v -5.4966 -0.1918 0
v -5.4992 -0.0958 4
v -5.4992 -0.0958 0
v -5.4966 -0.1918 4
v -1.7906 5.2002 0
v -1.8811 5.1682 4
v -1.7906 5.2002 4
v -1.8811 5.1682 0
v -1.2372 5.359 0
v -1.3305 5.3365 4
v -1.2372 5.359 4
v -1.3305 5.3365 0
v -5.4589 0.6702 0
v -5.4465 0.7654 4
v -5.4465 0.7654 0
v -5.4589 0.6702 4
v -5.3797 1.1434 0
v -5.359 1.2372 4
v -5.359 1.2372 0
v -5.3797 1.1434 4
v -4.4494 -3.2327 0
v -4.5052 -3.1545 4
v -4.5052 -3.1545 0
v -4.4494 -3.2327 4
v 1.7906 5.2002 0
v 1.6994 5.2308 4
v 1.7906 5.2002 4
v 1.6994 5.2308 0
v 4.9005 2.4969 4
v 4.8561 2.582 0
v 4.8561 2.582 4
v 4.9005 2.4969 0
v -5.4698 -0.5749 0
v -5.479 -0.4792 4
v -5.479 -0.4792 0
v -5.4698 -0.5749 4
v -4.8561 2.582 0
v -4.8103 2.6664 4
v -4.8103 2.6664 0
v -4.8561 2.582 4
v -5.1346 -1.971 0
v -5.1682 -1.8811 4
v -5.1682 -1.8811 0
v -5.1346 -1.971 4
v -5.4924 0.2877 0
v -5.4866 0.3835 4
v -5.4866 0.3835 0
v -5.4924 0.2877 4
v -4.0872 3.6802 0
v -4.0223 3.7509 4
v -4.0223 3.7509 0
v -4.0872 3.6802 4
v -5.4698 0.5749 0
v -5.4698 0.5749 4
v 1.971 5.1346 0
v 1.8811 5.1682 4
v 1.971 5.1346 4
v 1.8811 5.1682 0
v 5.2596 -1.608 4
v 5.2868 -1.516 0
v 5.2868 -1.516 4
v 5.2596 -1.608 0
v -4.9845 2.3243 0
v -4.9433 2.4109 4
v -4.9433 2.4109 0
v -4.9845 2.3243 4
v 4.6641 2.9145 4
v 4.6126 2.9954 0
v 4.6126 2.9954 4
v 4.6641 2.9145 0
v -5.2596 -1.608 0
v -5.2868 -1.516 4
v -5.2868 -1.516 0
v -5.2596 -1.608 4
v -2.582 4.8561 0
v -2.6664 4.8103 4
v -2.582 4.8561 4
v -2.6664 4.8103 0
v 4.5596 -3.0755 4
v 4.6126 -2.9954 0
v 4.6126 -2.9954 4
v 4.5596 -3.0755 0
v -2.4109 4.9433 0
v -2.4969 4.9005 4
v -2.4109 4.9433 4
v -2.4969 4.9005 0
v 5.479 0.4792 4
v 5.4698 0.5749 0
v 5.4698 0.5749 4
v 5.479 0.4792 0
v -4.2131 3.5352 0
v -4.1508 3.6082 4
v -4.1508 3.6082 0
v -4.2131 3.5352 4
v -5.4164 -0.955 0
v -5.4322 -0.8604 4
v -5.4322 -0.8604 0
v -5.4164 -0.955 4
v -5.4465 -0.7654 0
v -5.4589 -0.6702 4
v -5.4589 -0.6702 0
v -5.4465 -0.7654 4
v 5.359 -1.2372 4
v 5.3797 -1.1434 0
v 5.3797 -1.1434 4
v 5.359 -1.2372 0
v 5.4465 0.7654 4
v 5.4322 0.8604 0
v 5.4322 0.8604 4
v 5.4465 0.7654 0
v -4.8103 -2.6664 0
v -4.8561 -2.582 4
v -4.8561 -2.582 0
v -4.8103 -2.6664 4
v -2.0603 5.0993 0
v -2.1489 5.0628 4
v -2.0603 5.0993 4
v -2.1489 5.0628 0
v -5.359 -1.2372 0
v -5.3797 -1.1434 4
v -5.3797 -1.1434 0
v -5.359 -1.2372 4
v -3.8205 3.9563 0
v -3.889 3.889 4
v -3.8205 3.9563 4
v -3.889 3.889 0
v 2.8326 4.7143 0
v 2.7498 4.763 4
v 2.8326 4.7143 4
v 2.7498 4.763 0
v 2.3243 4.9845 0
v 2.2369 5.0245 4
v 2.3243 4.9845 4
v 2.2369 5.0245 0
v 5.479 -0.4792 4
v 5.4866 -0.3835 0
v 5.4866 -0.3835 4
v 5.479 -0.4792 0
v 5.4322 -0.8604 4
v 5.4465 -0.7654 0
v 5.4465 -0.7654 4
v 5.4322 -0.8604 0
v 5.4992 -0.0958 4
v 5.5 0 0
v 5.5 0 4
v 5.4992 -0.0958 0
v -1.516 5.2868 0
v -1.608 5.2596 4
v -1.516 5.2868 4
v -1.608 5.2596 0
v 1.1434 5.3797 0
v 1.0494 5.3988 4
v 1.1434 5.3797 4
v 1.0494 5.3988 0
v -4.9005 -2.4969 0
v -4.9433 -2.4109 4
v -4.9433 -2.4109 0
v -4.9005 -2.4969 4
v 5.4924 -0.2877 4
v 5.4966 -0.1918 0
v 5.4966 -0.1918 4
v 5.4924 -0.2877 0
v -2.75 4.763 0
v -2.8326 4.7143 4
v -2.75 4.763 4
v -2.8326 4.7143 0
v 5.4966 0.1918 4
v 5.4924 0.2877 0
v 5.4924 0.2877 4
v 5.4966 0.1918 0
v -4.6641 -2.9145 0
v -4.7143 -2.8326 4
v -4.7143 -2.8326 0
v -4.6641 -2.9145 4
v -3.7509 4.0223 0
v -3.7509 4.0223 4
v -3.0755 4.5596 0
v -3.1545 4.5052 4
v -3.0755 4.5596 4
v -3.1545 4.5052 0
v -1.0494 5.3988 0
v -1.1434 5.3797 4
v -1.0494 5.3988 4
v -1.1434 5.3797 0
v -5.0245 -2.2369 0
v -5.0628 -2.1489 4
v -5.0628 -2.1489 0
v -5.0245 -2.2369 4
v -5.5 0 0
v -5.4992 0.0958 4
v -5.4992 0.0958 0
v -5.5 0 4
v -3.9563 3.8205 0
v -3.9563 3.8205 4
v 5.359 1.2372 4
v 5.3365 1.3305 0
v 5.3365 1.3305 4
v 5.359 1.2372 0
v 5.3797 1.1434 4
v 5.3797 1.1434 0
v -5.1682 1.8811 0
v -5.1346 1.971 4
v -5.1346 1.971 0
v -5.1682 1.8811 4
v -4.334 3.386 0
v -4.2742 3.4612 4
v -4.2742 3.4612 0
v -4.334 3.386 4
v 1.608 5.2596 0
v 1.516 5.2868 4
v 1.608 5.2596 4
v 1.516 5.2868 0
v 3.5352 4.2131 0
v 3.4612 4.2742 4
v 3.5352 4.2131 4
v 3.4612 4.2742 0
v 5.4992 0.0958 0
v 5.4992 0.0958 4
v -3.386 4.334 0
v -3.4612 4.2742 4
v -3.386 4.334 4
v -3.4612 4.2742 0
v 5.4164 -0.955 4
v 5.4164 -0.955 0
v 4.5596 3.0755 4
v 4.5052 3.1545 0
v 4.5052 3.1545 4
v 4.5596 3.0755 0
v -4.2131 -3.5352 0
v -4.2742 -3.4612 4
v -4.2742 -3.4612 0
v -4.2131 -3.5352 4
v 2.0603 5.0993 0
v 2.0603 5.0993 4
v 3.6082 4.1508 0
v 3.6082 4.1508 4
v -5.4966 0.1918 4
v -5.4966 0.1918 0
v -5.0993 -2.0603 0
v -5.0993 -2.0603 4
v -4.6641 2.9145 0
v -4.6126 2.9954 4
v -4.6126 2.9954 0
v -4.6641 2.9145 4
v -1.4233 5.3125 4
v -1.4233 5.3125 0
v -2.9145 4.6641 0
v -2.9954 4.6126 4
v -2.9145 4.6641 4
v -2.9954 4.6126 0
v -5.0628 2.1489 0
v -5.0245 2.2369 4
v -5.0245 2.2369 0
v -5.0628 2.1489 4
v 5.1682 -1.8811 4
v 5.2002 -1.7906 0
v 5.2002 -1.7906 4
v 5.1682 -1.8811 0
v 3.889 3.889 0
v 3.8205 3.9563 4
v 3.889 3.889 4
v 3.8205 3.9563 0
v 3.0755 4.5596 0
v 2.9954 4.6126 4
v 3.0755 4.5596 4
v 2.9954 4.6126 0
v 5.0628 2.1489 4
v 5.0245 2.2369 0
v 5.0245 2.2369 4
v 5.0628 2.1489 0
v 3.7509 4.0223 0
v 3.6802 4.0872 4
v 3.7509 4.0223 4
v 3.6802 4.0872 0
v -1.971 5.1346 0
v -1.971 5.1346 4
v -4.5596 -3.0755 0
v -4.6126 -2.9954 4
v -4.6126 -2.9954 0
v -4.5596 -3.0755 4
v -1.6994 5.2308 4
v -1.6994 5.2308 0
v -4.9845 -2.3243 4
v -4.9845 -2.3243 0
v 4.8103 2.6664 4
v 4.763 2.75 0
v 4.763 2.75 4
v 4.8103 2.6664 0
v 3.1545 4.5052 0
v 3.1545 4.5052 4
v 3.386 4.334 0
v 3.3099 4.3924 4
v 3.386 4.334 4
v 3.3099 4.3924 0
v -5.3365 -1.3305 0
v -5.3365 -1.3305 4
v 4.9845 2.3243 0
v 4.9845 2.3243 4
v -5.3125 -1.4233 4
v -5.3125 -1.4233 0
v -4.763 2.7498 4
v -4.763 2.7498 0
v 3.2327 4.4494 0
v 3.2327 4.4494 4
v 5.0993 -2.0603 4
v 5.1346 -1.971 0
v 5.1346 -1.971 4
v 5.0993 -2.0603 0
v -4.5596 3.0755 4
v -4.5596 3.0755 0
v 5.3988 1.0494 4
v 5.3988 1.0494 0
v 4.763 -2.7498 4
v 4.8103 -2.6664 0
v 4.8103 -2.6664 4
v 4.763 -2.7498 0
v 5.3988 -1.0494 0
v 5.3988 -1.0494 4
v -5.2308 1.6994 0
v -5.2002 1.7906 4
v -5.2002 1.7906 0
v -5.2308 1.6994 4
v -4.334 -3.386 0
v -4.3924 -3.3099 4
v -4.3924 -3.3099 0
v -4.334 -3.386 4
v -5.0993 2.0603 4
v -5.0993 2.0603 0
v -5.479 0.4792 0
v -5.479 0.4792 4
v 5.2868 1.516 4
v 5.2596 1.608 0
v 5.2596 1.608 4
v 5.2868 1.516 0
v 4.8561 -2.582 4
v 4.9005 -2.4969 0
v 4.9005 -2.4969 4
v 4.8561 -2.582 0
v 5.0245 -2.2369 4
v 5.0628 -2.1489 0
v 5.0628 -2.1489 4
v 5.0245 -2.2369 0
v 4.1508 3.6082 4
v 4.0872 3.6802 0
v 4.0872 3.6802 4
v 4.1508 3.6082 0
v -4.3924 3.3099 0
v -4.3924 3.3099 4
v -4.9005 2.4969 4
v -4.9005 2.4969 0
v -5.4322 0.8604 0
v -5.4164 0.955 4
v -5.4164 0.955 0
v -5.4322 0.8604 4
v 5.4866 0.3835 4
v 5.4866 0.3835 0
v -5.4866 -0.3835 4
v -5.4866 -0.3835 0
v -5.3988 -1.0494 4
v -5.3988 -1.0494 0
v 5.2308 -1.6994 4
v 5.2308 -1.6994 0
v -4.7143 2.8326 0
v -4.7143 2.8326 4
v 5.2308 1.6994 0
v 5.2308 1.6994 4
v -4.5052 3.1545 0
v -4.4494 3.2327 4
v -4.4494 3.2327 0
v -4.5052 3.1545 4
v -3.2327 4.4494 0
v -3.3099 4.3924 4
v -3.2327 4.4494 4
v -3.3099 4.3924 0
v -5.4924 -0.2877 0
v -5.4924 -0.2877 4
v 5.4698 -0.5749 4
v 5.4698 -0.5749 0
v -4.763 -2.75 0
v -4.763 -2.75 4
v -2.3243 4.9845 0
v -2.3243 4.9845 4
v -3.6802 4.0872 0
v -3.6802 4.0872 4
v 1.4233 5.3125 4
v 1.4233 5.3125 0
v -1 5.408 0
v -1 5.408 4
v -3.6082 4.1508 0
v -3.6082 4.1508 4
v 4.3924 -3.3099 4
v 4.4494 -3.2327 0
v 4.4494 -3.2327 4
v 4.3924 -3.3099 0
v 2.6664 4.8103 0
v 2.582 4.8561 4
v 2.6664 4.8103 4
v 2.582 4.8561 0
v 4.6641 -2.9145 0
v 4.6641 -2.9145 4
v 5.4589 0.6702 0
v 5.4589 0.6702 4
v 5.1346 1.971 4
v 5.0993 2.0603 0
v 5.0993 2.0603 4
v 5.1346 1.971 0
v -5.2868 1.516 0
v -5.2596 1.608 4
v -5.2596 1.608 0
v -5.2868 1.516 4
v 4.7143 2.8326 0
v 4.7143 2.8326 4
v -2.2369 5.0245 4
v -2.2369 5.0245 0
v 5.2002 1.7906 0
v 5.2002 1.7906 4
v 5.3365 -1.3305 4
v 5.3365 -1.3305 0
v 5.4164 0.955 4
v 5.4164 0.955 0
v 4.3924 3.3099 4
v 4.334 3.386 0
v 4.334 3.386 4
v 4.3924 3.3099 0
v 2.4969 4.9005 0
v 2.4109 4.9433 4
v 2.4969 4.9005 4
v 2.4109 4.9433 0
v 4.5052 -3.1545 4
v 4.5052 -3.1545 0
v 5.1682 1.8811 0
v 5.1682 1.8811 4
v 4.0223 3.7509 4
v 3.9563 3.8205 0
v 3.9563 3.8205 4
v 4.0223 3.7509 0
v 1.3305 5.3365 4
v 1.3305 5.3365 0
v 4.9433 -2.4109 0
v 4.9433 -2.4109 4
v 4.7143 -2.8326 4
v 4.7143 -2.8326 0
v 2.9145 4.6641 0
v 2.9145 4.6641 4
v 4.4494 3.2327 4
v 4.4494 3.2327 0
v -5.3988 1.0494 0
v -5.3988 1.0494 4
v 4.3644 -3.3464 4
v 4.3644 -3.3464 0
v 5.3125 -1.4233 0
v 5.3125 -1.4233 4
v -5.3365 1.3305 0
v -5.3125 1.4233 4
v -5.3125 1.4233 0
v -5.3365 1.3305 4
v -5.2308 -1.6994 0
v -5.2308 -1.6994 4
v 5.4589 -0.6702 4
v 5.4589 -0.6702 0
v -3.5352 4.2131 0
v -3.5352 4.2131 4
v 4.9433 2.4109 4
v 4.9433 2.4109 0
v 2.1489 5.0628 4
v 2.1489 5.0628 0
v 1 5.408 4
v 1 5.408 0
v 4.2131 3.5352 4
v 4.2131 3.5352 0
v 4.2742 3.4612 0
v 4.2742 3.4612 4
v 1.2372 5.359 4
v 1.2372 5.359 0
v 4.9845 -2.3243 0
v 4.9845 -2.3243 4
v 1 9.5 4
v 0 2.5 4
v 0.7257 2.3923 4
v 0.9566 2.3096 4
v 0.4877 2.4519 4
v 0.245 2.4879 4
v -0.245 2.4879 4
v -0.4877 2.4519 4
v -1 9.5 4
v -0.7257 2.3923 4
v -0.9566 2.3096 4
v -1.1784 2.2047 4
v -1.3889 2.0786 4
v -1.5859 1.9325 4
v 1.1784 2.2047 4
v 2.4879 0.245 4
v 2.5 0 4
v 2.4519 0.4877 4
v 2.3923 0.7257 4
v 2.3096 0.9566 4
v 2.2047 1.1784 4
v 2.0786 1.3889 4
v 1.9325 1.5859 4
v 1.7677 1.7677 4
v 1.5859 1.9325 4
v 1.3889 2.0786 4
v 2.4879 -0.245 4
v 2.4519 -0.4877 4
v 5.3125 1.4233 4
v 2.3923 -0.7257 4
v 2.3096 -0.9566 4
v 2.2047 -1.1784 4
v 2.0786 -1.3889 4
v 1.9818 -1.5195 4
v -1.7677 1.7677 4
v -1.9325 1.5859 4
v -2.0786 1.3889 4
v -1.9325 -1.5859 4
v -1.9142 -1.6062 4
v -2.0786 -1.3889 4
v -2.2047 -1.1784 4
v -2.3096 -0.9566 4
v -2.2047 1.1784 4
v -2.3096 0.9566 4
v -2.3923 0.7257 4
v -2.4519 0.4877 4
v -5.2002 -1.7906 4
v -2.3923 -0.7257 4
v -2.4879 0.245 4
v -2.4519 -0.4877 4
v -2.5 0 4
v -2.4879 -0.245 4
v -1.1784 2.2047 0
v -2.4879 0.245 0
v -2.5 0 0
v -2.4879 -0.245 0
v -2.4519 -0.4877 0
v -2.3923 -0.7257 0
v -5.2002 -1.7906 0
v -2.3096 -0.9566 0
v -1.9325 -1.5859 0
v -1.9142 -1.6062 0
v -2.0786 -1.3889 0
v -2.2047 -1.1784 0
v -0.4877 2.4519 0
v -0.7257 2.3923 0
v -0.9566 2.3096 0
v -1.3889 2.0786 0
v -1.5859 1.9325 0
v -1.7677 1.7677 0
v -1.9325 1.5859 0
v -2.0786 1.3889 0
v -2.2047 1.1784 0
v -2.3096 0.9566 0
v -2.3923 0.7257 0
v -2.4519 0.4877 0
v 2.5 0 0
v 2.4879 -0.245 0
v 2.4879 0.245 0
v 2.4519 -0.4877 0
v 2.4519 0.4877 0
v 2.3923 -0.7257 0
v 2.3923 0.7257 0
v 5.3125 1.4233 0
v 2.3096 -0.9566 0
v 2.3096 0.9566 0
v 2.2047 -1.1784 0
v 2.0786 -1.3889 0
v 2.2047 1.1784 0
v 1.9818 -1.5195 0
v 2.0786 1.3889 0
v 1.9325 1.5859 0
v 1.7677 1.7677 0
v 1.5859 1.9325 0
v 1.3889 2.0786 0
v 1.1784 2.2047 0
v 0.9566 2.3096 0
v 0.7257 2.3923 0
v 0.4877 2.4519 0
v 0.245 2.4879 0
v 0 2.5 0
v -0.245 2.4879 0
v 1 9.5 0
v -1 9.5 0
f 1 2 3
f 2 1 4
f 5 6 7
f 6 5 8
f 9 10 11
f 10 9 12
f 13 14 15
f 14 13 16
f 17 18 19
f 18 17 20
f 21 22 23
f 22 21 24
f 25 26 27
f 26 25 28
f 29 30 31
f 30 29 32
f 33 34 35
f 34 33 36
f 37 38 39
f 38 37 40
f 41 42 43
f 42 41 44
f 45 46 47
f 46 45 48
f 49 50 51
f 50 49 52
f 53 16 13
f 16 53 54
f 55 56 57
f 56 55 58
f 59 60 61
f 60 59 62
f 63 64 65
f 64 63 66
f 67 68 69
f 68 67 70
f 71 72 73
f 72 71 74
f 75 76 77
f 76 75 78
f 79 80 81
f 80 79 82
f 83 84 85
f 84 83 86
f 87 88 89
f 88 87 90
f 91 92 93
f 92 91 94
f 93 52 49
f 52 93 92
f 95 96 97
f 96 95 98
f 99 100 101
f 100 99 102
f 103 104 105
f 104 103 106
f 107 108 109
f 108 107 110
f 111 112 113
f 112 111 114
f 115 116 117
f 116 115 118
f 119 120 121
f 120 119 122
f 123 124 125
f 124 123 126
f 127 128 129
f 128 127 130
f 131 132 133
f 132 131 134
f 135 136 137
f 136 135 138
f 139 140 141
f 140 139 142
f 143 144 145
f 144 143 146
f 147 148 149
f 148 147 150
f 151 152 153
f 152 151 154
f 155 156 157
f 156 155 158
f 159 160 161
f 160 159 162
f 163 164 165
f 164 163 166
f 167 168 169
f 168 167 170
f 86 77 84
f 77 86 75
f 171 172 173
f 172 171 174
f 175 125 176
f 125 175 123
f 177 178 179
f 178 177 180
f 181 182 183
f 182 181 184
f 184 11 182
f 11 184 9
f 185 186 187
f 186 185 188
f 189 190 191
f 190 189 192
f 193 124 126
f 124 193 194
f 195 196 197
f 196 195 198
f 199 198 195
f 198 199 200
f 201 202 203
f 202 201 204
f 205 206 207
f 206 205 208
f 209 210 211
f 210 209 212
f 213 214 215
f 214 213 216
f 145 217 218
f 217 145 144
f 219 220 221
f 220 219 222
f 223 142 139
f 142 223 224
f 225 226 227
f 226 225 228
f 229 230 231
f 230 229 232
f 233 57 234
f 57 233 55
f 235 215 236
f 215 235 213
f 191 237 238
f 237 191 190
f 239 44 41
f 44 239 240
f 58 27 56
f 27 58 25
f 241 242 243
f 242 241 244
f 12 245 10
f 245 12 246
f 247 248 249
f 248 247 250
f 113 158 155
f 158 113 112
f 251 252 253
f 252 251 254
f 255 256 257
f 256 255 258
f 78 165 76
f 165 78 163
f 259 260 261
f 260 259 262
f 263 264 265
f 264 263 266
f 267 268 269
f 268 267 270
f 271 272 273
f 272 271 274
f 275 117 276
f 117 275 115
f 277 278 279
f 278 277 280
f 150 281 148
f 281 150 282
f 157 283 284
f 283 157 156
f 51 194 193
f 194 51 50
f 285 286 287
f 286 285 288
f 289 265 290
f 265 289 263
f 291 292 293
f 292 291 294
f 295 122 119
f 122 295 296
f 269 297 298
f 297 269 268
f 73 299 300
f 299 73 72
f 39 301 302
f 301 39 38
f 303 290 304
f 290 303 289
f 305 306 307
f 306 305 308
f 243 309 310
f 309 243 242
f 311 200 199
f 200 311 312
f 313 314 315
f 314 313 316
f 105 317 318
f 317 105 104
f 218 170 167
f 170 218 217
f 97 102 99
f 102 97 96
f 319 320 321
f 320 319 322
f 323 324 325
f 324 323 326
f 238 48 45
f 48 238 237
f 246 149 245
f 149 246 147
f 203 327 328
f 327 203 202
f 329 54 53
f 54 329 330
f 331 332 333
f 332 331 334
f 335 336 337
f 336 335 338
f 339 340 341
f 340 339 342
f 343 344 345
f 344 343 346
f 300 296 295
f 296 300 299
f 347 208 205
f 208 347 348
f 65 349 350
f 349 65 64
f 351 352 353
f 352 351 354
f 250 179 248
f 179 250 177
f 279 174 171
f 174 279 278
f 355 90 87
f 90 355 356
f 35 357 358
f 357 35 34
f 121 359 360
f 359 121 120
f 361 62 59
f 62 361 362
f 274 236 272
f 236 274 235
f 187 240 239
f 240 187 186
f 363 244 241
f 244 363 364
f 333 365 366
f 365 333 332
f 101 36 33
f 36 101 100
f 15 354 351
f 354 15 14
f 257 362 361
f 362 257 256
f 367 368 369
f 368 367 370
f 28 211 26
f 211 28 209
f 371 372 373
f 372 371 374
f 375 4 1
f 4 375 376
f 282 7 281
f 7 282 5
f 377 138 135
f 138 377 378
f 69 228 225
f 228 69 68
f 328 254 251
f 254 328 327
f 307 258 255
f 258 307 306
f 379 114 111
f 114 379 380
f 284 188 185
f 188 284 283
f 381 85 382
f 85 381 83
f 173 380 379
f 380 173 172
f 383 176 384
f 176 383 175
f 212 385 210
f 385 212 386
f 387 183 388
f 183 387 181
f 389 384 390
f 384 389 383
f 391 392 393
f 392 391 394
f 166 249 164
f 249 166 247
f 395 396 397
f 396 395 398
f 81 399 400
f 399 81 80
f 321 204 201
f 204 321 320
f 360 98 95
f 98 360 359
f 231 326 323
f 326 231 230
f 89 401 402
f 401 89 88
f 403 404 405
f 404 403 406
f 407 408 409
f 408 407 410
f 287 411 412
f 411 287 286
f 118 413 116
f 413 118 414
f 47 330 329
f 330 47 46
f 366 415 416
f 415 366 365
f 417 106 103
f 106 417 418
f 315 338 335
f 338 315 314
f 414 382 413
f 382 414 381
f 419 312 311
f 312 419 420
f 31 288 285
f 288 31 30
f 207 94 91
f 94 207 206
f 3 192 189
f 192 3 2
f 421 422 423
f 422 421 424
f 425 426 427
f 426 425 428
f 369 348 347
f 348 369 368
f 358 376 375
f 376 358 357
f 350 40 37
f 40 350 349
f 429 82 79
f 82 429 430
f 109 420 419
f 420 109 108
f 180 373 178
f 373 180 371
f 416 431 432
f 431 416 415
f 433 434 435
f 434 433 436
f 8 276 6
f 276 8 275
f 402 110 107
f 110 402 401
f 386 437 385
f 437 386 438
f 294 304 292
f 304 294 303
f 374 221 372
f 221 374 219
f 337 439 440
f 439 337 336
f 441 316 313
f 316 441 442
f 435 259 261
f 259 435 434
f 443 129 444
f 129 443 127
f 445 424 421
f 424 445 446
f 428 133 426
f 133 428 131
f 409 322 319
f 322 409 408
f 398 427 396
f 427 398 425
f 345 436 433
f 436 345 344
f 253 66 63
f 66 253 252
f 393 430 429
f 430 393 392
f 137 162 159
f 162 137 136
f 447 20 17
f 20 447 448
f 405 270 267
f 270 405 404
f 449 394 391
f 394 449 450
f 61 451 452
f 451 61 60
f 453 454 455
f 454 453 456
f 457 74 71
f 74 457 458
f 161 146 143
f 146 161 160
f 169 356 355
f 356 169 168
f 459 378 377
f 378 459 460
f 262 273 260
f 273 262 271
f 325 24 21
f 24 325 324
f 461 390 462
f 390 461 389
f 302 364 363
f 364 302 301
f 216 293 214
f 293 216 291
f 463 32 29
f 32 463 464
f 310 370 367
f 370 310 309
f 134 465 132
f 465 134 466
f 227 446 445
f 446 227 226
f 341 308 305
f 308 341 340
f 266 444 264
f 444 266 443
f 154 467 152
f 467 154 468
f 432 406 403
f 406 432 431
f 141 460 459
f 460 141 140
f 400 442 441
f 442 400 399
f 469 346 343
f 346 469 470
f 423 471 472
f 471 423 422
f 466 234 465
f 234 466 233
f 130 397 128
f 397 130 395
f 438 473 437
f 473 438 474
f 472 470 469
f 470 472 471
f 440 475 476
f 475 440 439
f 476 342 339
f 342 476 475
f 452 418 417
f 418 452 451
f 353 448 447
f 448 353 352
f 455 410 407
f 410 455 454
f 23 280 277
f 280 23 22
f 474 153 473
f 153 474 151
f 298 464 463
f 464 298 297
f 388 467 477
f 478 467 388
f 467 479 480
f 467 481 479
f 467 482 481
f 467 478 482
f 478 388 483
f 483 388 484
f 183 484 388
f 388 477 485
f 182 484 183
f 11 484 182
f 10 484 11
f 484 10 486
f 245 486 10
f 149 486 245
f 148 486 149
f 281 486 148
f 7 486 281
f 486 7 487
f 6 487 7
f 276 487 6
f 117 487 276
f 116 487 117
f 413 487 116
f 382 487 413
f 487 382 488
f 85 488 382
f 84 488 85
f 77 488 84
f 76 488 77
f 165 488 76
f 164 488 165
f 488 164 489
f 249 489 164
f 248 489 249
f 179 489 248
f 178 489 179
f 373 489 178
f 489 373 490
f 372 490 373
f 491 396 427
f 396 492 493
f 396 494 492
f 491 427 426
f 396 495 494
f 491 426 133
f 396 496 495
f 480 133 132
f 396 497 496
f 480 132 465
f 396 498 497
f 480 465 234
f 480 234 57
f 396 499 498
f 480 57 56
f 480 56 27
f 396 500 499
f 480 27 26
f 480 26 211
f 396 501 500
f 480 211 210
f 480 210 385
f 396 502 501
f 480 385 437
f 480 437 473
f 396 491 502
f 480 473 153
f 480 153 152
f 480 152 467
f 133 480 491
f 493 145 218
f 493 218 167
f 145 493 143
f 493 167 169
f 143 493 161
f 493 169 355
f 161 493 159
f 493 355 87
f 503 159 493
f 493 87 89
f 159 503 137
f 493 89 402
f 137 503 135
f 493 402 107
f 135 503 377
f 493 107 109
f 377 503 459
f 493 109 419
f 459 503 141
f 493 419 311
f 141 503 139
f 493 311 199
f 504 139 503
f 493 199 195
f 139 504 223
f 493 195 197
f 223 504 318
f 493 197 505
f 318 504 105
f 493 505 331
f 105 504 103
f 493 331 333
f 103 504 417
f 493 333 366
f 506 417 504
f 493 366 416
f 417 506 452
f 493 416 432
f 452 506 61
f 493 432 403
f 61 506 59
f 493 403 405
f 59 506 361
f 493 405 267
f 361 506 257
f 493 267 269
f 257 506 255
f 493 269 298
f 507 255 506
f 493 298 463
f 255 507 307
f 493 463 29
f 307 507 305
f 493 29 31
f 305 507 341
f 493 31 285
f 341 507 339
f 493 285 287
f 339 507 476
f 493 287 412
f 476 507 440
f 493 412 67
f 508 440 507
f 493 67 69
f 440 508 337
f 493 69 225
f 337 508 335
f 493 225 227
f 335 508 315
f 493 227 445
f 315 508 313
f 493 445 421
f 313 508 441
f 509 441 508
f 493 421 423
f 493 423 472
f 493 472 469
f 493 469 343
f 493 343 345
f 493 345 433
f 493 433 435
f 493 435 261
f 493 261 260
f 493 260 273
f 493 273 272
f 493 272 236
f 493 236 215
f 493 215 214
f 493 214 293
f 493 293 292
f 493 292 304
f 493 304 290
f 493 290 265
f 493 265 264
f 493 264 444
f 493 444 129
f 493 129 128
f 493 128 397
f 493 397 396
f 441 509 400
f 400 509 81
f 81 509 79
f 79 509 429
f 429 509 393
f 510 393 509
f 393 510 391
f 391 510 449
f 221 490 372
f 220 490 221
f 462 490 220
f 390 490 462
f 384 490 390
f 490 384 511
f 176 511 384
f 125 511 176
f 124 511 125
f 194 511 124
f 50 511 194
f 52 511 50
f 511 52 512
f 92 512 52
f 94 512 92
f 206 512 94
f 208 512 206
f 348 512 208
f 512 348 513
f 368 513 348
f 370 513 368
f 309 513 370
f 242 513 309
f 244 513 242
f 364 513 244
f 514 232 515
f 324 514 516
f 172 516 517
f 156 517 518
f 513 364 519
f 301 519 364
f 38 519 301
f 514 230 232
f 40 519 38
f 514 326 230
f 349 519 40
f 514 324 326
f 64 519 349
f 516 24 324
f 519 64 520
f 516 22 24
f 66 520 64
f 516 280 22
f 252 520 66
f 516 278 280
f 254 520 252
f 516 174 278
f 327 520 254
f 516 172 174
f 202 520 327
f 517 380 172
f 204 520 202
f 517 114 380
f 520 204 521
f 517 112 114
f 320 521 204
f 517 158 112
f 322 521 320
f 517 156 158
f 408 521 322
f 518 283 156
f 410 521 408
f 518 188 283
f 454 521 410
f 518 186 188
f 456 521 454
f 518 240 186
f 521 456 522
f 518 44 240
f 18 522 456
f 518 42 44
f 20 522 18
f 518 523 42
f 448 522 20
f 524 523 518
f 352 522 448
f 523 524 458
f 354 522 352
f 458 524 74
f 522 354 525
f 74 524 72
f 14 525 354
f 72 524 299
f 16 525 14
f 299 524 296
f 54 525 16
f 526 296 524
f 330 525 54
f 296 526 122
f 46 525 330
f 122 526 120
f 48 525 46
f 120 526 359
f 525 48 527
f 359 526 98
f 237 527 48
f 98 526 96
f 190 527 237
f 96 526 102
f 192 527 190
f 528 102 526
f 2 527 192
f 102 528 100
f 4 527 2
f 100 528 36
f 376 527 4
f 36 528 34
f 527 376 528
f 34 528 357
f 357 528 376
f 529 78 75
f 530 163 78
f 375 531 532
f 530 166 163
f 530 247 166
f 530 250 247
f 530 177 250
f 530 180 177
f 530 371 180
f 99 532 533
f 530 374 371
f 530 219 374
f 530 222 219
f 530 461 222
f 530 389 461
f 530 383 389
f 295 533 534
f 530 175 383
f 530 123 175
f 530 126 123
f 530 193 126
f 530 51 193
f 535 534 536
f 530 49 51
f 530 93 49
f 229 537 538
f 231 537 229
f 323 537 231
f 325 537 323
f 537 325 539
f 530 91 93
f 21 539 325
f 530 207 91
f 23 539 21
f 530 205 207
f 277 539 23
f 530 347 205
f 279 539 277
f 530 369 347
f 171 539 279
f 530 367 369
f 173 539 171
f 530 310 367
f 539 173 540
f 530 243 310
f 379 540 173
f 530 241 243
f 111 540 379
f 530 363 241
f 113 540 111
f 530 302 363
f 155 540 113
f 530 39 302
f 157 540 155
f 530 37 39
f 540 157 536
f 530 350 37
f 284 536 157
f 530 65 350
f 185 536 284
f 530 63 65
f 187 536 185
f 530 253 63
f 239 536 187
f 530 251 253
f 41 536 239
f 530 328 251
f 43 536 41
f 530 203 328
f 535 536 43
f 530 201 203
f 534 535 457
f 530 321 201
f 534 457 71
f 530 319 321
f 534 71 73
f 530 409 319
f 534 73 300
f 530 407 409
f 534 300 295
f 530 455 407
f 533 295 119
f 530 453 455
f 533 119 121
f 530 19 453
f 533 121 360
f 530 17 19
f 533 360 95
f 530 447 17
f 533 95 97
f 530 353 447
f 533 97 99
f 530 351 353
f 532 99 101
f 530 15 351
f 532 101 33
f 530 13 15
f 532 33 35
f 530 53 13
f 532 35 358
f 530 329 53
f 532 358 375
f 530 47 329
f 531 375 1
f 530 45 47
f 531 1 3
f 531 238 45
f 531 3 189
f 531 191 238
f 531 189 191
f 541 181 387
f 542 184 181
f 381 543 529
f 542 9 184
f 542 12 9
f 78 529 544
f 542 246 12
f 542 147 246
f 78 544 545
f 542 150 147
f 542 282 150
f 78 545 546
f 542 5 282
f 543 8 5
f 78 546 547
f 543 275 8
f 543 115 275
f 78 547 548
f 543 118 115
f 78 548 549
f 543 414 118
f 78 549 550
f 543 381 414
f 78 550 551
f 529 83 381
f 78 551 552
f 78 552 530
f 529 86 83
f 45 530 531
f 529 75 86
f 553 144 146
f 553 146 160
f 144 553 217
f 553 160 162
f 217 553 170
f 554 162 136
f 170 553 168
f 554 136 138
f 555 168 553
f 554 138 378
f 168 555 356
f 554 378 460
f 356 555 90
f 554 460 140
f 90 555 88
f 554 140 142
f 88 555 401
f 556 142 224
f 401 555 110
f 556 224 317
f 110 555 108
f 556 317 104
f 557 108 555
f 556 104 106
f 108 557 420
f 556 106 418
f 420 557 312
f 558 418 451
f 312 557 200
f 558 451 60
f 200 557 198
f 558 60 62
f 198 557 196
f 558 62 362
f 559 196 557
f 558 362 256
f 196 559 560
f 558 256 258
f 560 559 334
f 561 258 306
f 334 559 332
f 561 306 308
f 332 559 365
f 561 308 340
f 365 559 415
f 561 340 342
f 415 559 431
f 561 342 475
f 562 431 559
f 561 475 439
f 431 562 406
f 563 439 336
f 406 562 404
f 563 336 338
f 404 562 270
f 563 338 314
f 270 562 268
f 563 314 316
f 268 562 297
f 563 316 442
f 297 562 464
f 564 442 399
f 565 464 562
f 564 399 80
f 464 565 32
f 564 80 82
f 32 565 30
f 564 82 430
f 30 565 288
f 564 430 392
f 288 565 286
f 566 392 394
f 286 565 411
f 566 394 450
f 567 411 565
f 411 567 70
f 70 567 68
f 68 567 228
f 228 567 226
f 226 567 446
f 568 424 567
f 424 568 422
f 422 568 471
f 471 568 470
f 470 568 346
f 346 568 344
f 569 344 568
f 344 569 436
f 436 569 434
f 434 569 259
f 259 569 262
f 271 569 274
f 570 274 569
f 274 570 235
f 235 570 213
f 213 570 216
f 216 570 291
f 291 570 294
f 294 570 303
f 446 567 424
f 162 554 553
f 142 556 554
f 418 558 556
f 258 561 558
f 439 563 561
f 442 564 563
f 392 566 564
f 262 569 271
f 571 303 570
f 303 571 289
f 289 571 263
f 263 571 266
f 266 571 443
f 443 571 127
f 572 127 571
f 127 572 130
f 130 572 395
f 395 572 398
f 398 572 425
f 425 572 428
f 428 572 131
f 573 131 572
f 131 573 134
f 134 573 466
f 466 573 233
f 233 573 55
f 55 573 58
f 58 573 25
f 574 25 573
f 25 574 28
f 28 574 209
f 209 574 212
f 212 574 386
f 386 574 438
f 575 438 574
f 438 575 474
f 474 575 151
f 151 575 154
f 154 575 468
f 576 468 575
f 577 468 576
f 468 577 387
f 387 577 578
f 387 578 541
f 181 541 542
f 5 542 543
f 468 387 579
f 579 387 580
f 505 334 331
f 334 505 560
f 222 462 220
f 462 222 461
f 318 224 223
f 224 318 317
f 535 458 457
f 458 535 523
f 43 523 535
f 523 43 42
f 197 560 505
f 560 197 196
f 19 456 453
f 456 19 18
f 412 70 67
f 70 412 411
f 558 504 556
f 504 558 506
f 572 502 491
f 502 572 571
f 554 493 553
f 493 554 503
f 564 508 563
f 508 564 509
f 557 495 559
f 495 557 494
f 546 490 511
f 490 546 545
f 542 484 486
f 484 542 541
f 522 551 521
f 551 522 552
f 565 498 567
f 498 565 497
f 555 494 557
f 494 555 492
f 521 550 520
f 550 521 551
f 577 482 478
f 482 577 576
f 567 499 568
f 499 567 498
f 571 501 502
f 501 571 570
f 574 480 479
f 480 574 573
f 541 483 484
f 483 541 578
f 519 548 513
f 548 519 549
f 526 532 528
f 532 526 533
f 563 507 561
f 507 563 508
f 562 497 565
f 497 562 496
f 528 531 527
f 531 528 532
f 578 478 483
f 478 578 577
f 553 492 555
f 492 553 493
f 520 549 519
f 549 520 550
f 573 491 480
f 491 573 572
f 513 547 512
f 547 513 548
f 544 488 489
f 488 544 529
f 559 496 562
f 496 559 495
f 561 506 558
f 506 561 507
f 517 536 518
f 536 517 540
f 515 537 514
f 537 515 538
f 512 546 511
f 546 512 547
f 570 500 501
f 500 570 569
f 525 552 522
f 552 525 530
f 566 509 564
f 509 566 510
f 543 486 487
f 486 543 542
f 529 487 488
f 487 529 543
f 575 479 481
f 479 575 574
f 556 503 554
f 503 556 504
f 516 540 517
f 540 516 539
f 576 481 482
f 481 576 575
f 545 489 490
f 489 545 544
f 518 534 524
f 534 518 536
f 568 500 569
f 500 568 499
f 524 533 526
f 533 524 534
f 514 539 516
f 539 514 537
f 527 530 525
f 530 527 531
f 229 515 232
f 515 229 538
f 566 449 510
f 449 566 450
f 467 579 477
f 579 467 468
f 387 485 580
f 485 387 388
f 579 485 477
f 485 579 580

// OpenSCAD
union()
{
    difference()
    {
        difference()
        {
            linear_extrude(height = 4.0, twist = 0.0, scale = 1.0, slices = 1, center = false)
            {
                scale([11.0, 11.0])
                {
                    M625();
                }
            }
            linear_extrude(height = 4.0, twist = 0.0, scale = 1.0, slices = 1, center = false)
            {
                scale([5.0, 5.0])
                {
                    M101();
                }
            }
        }
        linear_extrude(height = 4.0, twist = 0.0, scale = 1.0, slices = 1, center = false)
        {
            rotate(-140.0)
            {
                M152();
            }
        }
    }
    translate([0.0, 6.0, 0.0])
    {
        linear_extrude(height = 4.0, twist = 0.0, scale = 1.0, slices = 1, center = false)
        {
            scale([2.0, 7.0])
            {
                M8();
            }
        }
    }
}

module M625()
{
    polygon
    (
        points =
        [
            [0.5, 0.0], 
            [0.49992384757819563, 0.008726203218641756], 
            [0.4996954135095479, 0.017449748351250485], 
            [0.4993147673772869, 0.026167978121471914], 
            [0.4987820251299121, 0.03487823687206265], 
            [0.4980973490458728, 0.04357787137382909], 
            [0.49726094768413664, 0.05226423163382673], 
            [0.496273075820661, 0.06093467170257374], 
            [0.4951340343707852, 0.06958655048003272], 
            [0.4938441702975689, 0.07821723252011543], 
            [0.492403876506104, 0.08682408883346518], 
            [0.490813591723832, 0.09540449768827242], 
            [0.48907380036690284, 0.10395584540887966], 
            [0.4871850323926176, 0.1124755271719325], 
            [0.48514786313799824, 0.12096094779983387], 
            [0.48296291314453416, 0.1294095225512604], 
            [0.48063084796915945, 0.13781867790849958], 
            [0.4781523779815178, 0.14618585236136836], 
            [0.47552825814757677, 0.1545084971874737], 
            [0.4727592877996584, 0.16278407722857835], 
            [0.46984631039295416, 0.17101007166283438], 
            [0.46679021324860087, 0.17918397477265013], 
            [0.4635919272833937, 0.18730329670795604], 
            [0.46025242672622013, 0.1953655642446369], 
            [0.45677272882130043, 0.20336832153790008], 
            [0.45315389351832497, 0.21130913087034972], 
            [0.4493970231495835, 0.2191855733945387], 
            [0.44550326209418395, 0.22699524986977337], 
            [0.4414737964294635, 0.2347357813929454], 
            [0.43730985356969787, 0.24240481012316853], 
            [0.4330127018922193, 0.25], 
            [0.42858365035105617, 0.2575190374550271], 
            [0.424024048078213, 0.26495963211660245], 
            [0.419335283972712, 0.27231951750751354], 
            [0.41451878627752087, 0.2795964517353734], 
            [0.4095760221444959, 0.286788218175523], 
            [0.4045084971874737, 0.29389262614623657], 
            [0.3993177550236464, 0.30090751157602413], 
            [0.39400537680336095, 0.30783073766282915], 
            [0.38857298072848545, 0.31466019552491875], 
            [0.383022221559489, 0.3213938048432697], 
            [0.377354790111386, 0.32802951449525364], 
            [0.3715724127386971, 0.3345653031794291], 
            [0.36567685080958523, 0.34099918003124924], 
            [0.35966990016932554, 0.3473291852294987], 
            [0.3535533905932738, 0.35355339059327373], 
            [0.3473291852294986, 0.3596699001693256], 
            [0.34099918003124924, 0.36567685080958523], 
            [0.3345653031794291, 0.37157241273869707], 
            [0.32802951449525364, 0.377354790111386], 
            [0.3213938048432697, 0.383022221559489], 
            [0.31466019552491875, 0.3885729807284854], 
            [0.30783073766282915, 0.394005376803361], 
            [0.3009075115760242, 0.3993177550236464], 
            [0.29389262614623657, 0.4045084971874737], 
            [0.2867882181755231, 0.4095760221444959], 
            [0.2795964517353734, 0.41451878627752087], 
            [0.2723195175075136, 0.41933528397271197], 
            [0.26495963211660245, 0.424024048078213], 
            [0.2575190374550272, 0.4285836503510561], 
            [0.24999999999999994, 0.43301270189221935], 
            [0.24240481012316856, 0.43730985356969787], 
            [0.23473578139294543, 0.44147379642946344], 
            [0.2269952498697734, 0.4455032620941839], 
            [0.21918557339453873, 0.4493970231495835], 
            [0.21130913087034972, 0.45315389351832497], 
            [0.2033683215379001, 0.45677272882130043], 
            [0.19536556424463686, 0.4602524267262202], 
            [0.1873032967079561, 0.46359192728339366], 
            [0.17918397477265008, 0.46679021324860087], 
            [0.1710100716628344, 0.46984631039295416], 
            [0.16278407722857827, 0.4727592877996584], 
            [0.15450849718747373, 0.47552825814757677], 
            [0.14618585236136838, 0.4781523779815177], 
            [0.13781867790849958, 0.48063084796915945], 
            [0.12940952255126037, 0.48296291314453416], 
            [0.12096094779983384, 0.48514786313799824], 
            [0.11247552717193246, 0.4871850323926176], 
            [0.10395584540887962, 0.48907380036690284], 
            [0.09540449768827246, 0.490813591723832], 
            [0.08682408883346511, 0.49240387650610407], 
            [0.07821723252011546, 0.4938441702975689], 
            [0.06958655048003273, 0.4951340343707852], 
            [0.060934671702573745, 0.496273075820661], 
            [0.05226423163382673, 0.49726094768413664], 
            [0.04357787137382907, 0.4980973490458728], 
            [0.034878236872062617, 0.4987820251299121], 
            [0.026167978121471983, 0.4993147673772869], 
            [0.01744974835125043, 0.4996954135095479], 
            [0.0087262032186418, 0.49992384757819563], 
            [3.061616997868383E-17, 0.5], 
            [-0.008726203218641738, 0.49992384757819563], 
            [-0.01744974835125059, 0.4996954135095479], 
            [-0.02616797812147192, 0.4993147673772869], 
            [-0.034878236872062665, 0.4987820251299121], 
            [-0.04357787137382912, 0.4980973490458728], 
            [-0.052264231633826666, 0.4972609476841367], 
            [-0.06093467170257368, 0.49627307582066105], 
            [-0.06958655048003279, 0.4951340343707851], 
            [-0.07821723252011552, 0.49384417029756883], 
            [-0.08682408883346515, 0.492403876506104], 
            [-0.0954044976882724, 0.490813591723832], 
            [-0.10395584540887956, 0.48907380036690284], 
            [-0.11247552717193263, 0.48718503239261757], 
            [-0.12096094779983389, 0.48514786313799824], 
            [-0.12940952255126043, 0.48296291314453416], 
            [-0.13781867790849953, 0.48063084796915945], 
            [-0.14618585236136833, 0.4781523779815178], 
            [-0.15450849718747367, 0.4755282581475768], 
            [-0.1627840772285784, 0.47275928779965837], 
            [-0.17101007166283436, 0.4698463103929542], 
            [-0.17918397477265013, 0.46679021324860087], 
            [-0.18730329670795604, 0.4635919272833937], 
            [-0.1953655642446368, 0.4602524267262202], 
            [-0.20336832153790002, 0.4567727288213005], 
            [-0.21130913087034986, 0.4531538935183249], 
            [-0.21918557339453876, 0.44939702314958346], 
            [-0.22699524986977335, 0.44550326209418395], 
            [-0.23473578139294526, 0.44147379642946355], 
            [-0.2424048101231685, 0.4373098535696979], 
            [-0.2500000000000001, 0.43301270189221924], 
            [-0.25751903745502713, 0.42858365035105617], 
            [-0.2649596321166024, 0.42402404807821303], 
            [-0.27231951750751354, 0.41933528397271197], 
            [-0.27959645173537334, 0.41451878627752087], 
            [-0.2867882181755229, 0.409576022144496], 
            [-0.2938926261462365, 0.4045084971874737], 
            [-0.3009075115760242, 0.39931775502364636], 
            [-0.30783073766282915, 0.394005376803361], 
            [-0.31466019552491864, 0.3885729807284855], 
            [-0.3213938048432697, 0.383022221559489], 
            [-0.32802951449525375, 0.3773547901113859], 
            [-0.3345653031794291, 0.3715724127386971], 
            [-0.3409991800312492, 0.3656768508095853], 
            [-0.3473291852294987, 0.35966990016932554], 
            [-0.35355339059327373, 0.3535533905932738], 
            [-0.3596699001693255, 0.34732918522949874], 
            [-0.36567685080958523, 0.3409991800312493], 
            [-0.3715724127386972, 0.334565303179429], 
            [-0.377354790111386, 0.32802951449525364], 
            [-0.38302222155948895, 0.32139380484326974], 
            [-0.38857298072848545, 0.3146601955249187], 
            [-0.39400537680336106, 0.30783073766282903], 
            [-0.39931775502364647, 0.3009075115760241], 
            [-0.40450849718747367, 0.2938926261462366], 
            [-0.40957602214449595, 0.28678821817552297], 
            [-0.4145187862775208, 0.27959645173537345], 
            [-0.41933528397271197, 0.27231951750751365], 
            [-0.424024048078213, 0.26495963211660245], 
            [-0.4285836503510562, 0.257519037455027], 
            [-0.43301270189221935, 0.24999999999999997], 
            [-0.43730985356969787, 0.24240481012316858], 
            [-0.4414737964294635, 0.23473578139294535], 
            [-0.4455032620941839, 0.22699524986977343], 
            [-0.4493970231495835, 0.21918557339453865], 
            [-0.45315389351832497, 0.21130913087034975], 
            [-0.4567727288213005, 0.20336832153790002], 
            [-0.4602524267262202, 0.19536556424463689], 
            [-0.46359192728339366, 0.18730329670795612], 
            [-0.46679021324860087, 0.1791839747726501], 
            [-0.4698463103929542, 0.17101007166283425], 
            [-0.4727592877996584, 0.1627840772285783], 
            [-0.47552825814757677, 0.15450849718747375], 
            [-0.4781523779815177, 0.14618585236136852], 
            [-0.48063084796915945, 0.1378186779084996], 
            [-0.48296291314453416, 0.1294095225512603], 
            [-0.48514786313799824, 0.12096094779983387], 
            [-0.48718503239261757, 0.1124755271719326], 
            [-0.48907380036690284, 0.10395584540887966], 
            [-0.490813591723832, 0.09540449768827249], 
            [-0.492403876506104, 0.08682408883346514], 
            [-0.49384417029756883, 0.07821723252011549], 
            [-0.4951340343707852, 0.06958655048003266], 
            [-0.496273075820661, 0.06093467170257377], 
            [-0.49726094768413664, 0.05226423163382687], 
            [-0.4980973490458728, 0.0435778713738291], 
            [-0.49878202512991215, 0.03487823687206254], 
            [-0.4993147673772869, 0.026167978121471903], 
            [-0.4996954135095479, 0.01744974835125057], 
            [-0.49992384757819563, 0.00872620321864172], 
            [-0.5, 6.123233995736766E-17], 
            [-0.49992384757819563, -0.008726203218641596], 
            [-0.4996954135095479, -0.01744974835125045], 
            [-0.4993147673772869, -0.02616797812147178], 
            [-0.4987820251299121, -0.03487823687206286], 
            [-0.4980973490458728, -0.043577871373829194], 
            [-0.49726094768413664, -0.05226423163382675], 
            [-0.496273075820661, -0.06093467170257387], 
            [-0.4951340343707851, -0.06958655048003276], 
            [-0.4938441702975689, -0.07821723252011537], 
            [-0.492403876506104, -0.08682408883346523], 
            [-0.490813591723832, -0.09540449768827236], 
            [-0.48907380036690284, -0.10395584540887953], 
            [-0.4871850323926176, -0.11247552717193249], 
            [-0.48514786313799824, -0.12096094779983375], 
            [-0.4829629131445341, -0.1294095225512606], 
            [-0.4806308479691594, -0.13781867790849972], 
            [-0.4781523779815177, -0.14618585236136838], 
            [-0.47552825814757677, -0.15450849718747386], 
            [-0.47275928779965837, -0.16278407722857838], 
            [-0.4698463103929542, -0.17101007166283433], 
            [-0.46679021324860087, -0.17918397477265022], 
            [-0.4635919272833937, -0.187303296707956], 
            [-0.4602524267262202, -0.19536556424463677], 
            [-0.45677272882130054, -0.2033683215378999], 
            [-0.453153893518325, -0.21130913087034964], 
            [-0.4493970231495834, -0.21918557339453892], 
            [-0.44550326209418384, -0.22699524986977354], 
            [-0.44147379642946344, -0.23473578139294543], 
            [-0.4373098535696978, -0.24240481012316867], 
            [-0.4330127018922193, -0.25000000000000006], 
            [-0.42858365035105617, -0.2575190374550271], 
            [-0.42402404807821303, -0.2649596321166024], 
            [-0.419335283972712, -0.27231951750751354], 
            [-0.4145187862775209, -0.27959645173537334], 
            [-0.409576022144496, -0.2867882181755229], 
            [-0.4045084971874738, -0.2938926261462365], 
            [-0.3993177550236465, -0.300907511576024], 
            [-0.3940053768033609, -0.30783073766282926], 
            [-0.3885729807284854, -0.3146601955249188], 
            [-0.383022221559489, -0.3213938048432696], 
            [-0.37735479011138595, -0.3280295144952537], 
            [-0.3715724127386971, -0.3345653031794291], 
            [-0.3656768508095853, -0.3409991800312492], 
            [-0.35966990016932554, -0.3473291852294987], 
            [-0.35355339059327384, -0.35355339059327373], 
            [-0.3473291852294988, -0.35966990016932543], 
            [-0.3409991800312493, -0.36567685080958523], 
            [-0.33456530317942923, -0.371572412738697], 
            [-0.32802951449525347, -0.3773547901113861], 
            [-0.3213938048432694, -0.38302222155948923], 
            [-0.3146601955249186, -0.38857298072848556], 
            [-0.30783073766282903, -0.39400537680336106], 
            [-0.30090751157602413, -0.3993177550236464], 
            [-0.2938926261462366, -0.40450849718747367], 
            [-0.2867882181755232, -0.4095760221444958], 
            [-0.2795964517353736, -0.4145187862775207], 
            [-0.2723195175075135, -0.419335283972712], 
            [-0.2649596321166025, -0.424024048078213], 
            [-0.25751903745502724, -0.42858365035105606], 
            [-0.2499999999999998, -0.4330127018922194], 
            [-0.24240481012316842, -0.437309853569698], 
            [-0.23473578139294538, -0.4414737964294635], 
            [-0.22699524986977346, -0.4455032620941839], 
            [-0.21918557339453887, -0.4493970231495834], 
            [-0.21130913087034958, -0.453153893518325], 
            [-0.20336832153790005, -0.4567727288213005], 
            [-0.1953655642446369, -0.46025242672622013], 
            [-0.18730329670795615, -0.46359192728339366], 
            [-0.17918397477265036, -0.4667902132486008], 
            [-0.1710100716628347, -0.4698463103929541], 
            [-0.16278407722857832, -0.4727592877996584], 
            [-0.15450849718747378, -0.47552825814757677], 
            [-0.1461858523613681, -0.47815237798151783], 
            [-0.13781867790849944, -0.4806308479691595], 
            [-0.12940952255126031, -0.48296291314453416], 
            [-0.12096094779983389, -0.48514786313799824], 
            [-0.11247552717193263, -0.48718503239261757], 
            [-0.1039558454088799, -0.4890738003669028], 
            [-0.0954044976882723, -0.490813591723832], 
            [-0.08682408883346517, -0.492403876506104], 
            [-0.07821723252011552, -0.49384417029756883], 
            [-0.06958655048003247, -0.4951340343707852], 
            [-0.060934671702573585, -0.49627307582066105], 
            [-0.05226423163382668, -0.4972609476841367], 
            [-0.043577871373829125, -0.4980973490458728], 
            [-0.03487823687206279, -0.4987820251299121], 
            [-0.026167978121471713, -0.49931476737728697], 
            [-0.01744974835125038, -0.4996954135095479], 
            [-0.008726203218641749, -0.49992384757819563], 
            [-9.184850993605148E-17, -0.5], 
            [0.008726203218641565, -0.49992384757819563], 
            [0.017449748351250197, -0.4996954135095479], 
            [0.026167978121471973, -0.4993147673772869], 
            [0.03487823687206261, -0.49878202512991215], 
            [0.04357787137382939, -0.4980973490458727], 
            [0.05226423163382694, -0.49726094768413664], 
            [0.06093467170257384, -0.496273075820661], 
            [0.06958655048003273, -0.4951340343707852], 
            [0.07821723252011534, -0.4938441702975689], 
            [0.08682408883346499, -0.49240387650610407], 
            [0.09540449768827212, -0.49081359172383204], 
            [0.10395584540887971, -0.4890738003669028], 
            [0.11247552717193246, -0.4871850323926176], 
            [0.12096094779983416, -0.4851478631379982], 
            [0.12940952255126056, -0.4829629131445341], 
            [0.1378186779084997, -0.4806308479691594], 
            [0.14618585236136836, -0.4781523779815177], 
            [0.15450849718747361, -0.4755282581475768], 
            [0.16278407722857816, -0.4727592877996585], 
            [0.1710100716628345, -0.46984631039295416], 
            [0.1791839747726502, -0.46679021324860087], 
            [0.18730329670795598, -0.4635919272833937], 
            [0.19536556424463675, -0.46025242672622024], 
            [0.20336832153789988, -0.45677272882130054], 
            [0.2113091308703498, -0.45315389351832497], 
            [0.2191855733945387, -0.4493970231495835], 
            [0.22699524986977332, -0.44550326209418395], 
            [0.2347357813929456, -0.4414737964294634], 
            [0.24240481012316864, -0.4373098535696978], 
            [0.25000000000000006, -0.4330127018922193], 
            [0.2575190374550271, -0.42858365035105617], 
            [0.26495963211660234, -0.4240240480782131], 
            [0.2723195175075133, -0.41933528397271214], 
            [0.2795964517353735, -0.4145187862775208], 
            [0.286788218175523, -0.4095760221444959], 
            [0.29389262614623646, -0.4045084971874738], 
            [0.30090751157602436, -0.3993177550236463], 
            [0.30783073766282926, -0.3940053768033609], 
            [0.31466019552491875, -0.3885729807284854], 
            [0.3213938048432696, -0.38302222155948906], 
            [0.3280295144952535, -0.3773547901113861], 
            [0.33456530317942923, -0.371572412738697], 
            [0.3409991800312493, -0.3656768508095852], 
            [0.3473291852294986, -0.3596699001693256], 
            [0.3535533905932737, -0.35355339059327384], 
            [0.35966990016932543, -0.3473291852294988], 
            [0.365676850809585, -0.34099918003124946], 
            [0.3715724127386971, -0.33456530317942906], 
            [0.37735479011138595, -0.3280295144952537], 
            [0.38302222155948923, -0.32139380484326946], 
            [0.38857298072848556, -0.3146601955249186], 
            [0.394005376803361, -0.3078307376628291], 
            [0.3993177550236464, -0.30090751157602413], 
            [0.40450849718747367, -0.2938926261462367], 
            [0.4095760221444958, -0.28678821817552325], 
            [0.4145187862775207, -0.2795964517353737], 
            [0.419335283972712, -0.2723195175075135], 
            [0.424024048078213, -0.2649596321166025], 
            [0.4285836503510563, -0.25751903745502686], 
            [0.4330127018922194, -0.24999999999999983], 
            [0.4373098535696979, -0.24240481012316845], 
            [0.44147379642946344, -0.2347357813929454], 
            [0.4455032620941839, -0.22699524986977349], 
            [0.4493970231495834, -0.2191855733945389], 
            [0.453153893518325, -0.2113091308703496], 
            [0.4567727288213005, -0.20336832153790008], 
            [0.46025242672622013, -0.19536556424463694], 
            [0.46359192728339366, -0.18730329670795617], 
            [0.46679021324860076, -0.17918397477265038], 
            [0.4698463103929542, -0.1710100716628343], 
            [0.4727592877996584, -0.16278407722857835], 
            [0.47552825814757677, -0.1545084971874738], 
            [0.47815237798151783, -0.14618585236136813], 
            [0.48063084796915945, -0.13781867790849947], 
            [0.48296291314453416, -0.12940952255126034], 
            [0.48514786313799824, -0.12096094779983393], 
            [0.48718503239261757, -0.11247552717193267], 
            [0.4890738003669028, -0.10395584540887993], 
            [0.490813591723832, -0.09540449768827233], 
            [0.492403876506104, -0.0868240888334652], 
            [0.49384417029756894, -0.07821723252011512], 
            [0.4951340343707852, -0.0695865504800325], 
            [0.49627307582066105, -0.06093467170257361], 
            [0.49726094768413664, -0.05226423163382671], 
            [0.4980973490458728, -0.04357787137382916], 
            [0.4987820251299121, -0.03487823687206282], 
            [0.49931476737728697, -0.02616797812147174], 
            [0.4996954135095479, -0.017449748351250412], 
            [0.49992384757819563, -0.00872620321864178]
        ],
        paths =
        [
            [0, 1, 2, 3, 4, 5, 6, 7, 8, 9, 10, 11, 12, 13, 14, 15, 16, 17, 18, 19, 20, 21, 22, 23, 24, 25, 26, 27, 28, 29, 30, 31, 32, 33, 34, 35, 36, 37, 38, 39, 40, 41, 42, 43, 44, 45, 46, 47, 48, 49, 50, 51, 52, 53, 54, 55, 56, 57, 58, 59, 60, 61, 62, 63, 64, 65, 66, 67, 68, 69, 70, 71, 72, 73, 74, 75, 76, 77, 78, 79, 80, 81, 82, 83, 84, 85, 86, 87, 88, 89, 90, 91, 92, 93, 94, 95, 96, 97, 98, 99, 100, 101, 102, 103, 104, 105, 106, 107, 108, 109, 110, 111, 112, 113, 114, 115, 116, 117, 118, 119, 120, 121, 122, 123, 124, 125, 126, 127, 128, 129, 130, 131, 132, 133, 134, 135, 136, 137, 138, 139, 140, 141, 142, 143, 144, 145, 146, 147, 148, 149, 150, 151, 152, 153, 154, 155, 156, 157, 158, 159, 160, 161, 162, 163, 164, 165, 166, 167, 168, 169, 170, 171, 172, 173, 174, 175, 176, 177, 178, 179, 180, 181, 182, 183, 184, 185, 186, 187, 188, 189, 190, 191, 192, 193, 194, 195, 196, 197, 198, 199, 200, 201, 202, 203, 204, 205, 206, 207, 208, 209, 210, 211, 212, 213, 214, 215, 216, 217, 218, 219, 220, 221, 222, 223, 224, 225, 226, 227, 228, 229, 230, 231, 232, 233, 234, 235, 236, 237, 238, 239, 240, 241, 242, 243, 244, 245, 246, 247, 248, 249, 250, 251, 252, 253, 254, 255, 256, 257, 258, 259, 260, 261, 262, 263, 264, 265, 266, 267, 268, 269, 270, 271, 272, 273, 274, 275, 276, 277, 278, 279, 280, 281, 282, 283, 284, 285, 286, 287, 288, 289, 290, 291, 292, 293, 294, 295, 296, 297, 298, 299, 300, 301, 302, 303, 304, 305, 306, 307, 308, 309, 310, 311, 312, 313, 314, 315, 316, 317, 318, 319, 320, 321, 322, 323, 324, 325, 326, 327, 328, 329, 330, 331, 332, 333, 334, 335, 336, 337, 338, 339, 340, 341, 342, 343, 344, 345, 346, 347, 348, 349, 350, 351, 352, 353, 354, 355, 356, 357, 358, 359]
        ]
    );
}

module M101()
{
    polygon
    (
        points =
        [
            [0.5, 0.0], 
            [0.49759236333609846, 0.0490085701647803], 
            [0.4903926402016152, 0.09754516100806412], 
            [0.4784701678661044, 0.14514233862723117], 
            [0.46193976625564337, 0.1913417161825449], 
            [0.4409606321741775, 0.23569836841299882], 
            [0.4157348061512726, 0.2777851165098011], 
            [0.3865052266813685, 0.31719664208182274], 
            [0.3535533905932738, 0.35355339059327373], 
            [0.31719664208182274, 0.3865052266813685], 
            [0.27778511650980114, 0.4157348061512726], 
            [0.2356983684129989, 0.44096063217417747], 
            [0.19134171618254492, 0.46193976625564337], 
            [0.14514233862723117, 0.47847016786610447], 
            [0.09754516100806417, 0.4903926402016152], 
            [0.049008570164780385, 0.4975923633360984], 
            [3.061616997868383E-17, 0.5], 
            [-0.04900857016478032, 0.49759236333609846], 
            [-0.0975451610080641, 0.4903926402016152], 
            [-0.14514233862723108, 0.47847016786610447], 
            [-0.19134171618254486, 0.46193976625564337], 
            [-0.23569836841299885, 0.4409606321741775], 
            [-0.277785116509801, 0.41573480615127273], 
            [-0.3171966420818227, 0.38650522668136855], 
            [-0.35355339059327373, 0.3535533905932738], 
            [-0.3865052266813685, 0.31719664208182274], 
            [-0.4157348061512727, 0.2777851165098011], 
            [-0.44096063217417747, 0.23569836841299893], 
            [-0.46193976625564337, 0.19134171618254495], 
            [-0.4784701678661044, 0.1451423386272312], 
            [-0.4903926402016152, 0.0975451610080643], 
            [-0.4975923633360984, 0.04900857016478041], 
            [-0.5, 6.123233995736766E-17], 
            [-0.49759236333609846, -0.049008570164780295], 
            [-0.4903926402016152, -0.09754516100806418], 
            [-0.47847016786610447, -0.14514233862723105], 
            [-0.4619397662556434, -0.19134171618254484], 
            [-0.4409606321741775, -0.23569836841299882], 
            [-0.41573480615127273, -0.277785116509801], 
            [-0.38650522668136855, -0.31719664208182263], 
            [-0.35355339059327384, -0.35355339059327373], 
            [-0.31719664208182297, -0.38650522668136833], 
            [-0.2777851165098011, -0.4157348061512726], 
            [-0.23569836841299893, -0.44096063217417747], 
            [-0.19134171618254517, -0.46193976625564326], 
            [-0.14514233862723122, -0.4784701678661044], 
            [-0.09754516100806433, -0.49039264020161516], 
            [-0.049008570164780225, -0.49759236333609846], 
            [-9.184850993605148E-17, -0.5], 
            [0.049008570164780045, -0.49759236333609846], 
            [0.09754516100806415, -0.4903926402016152], 
            [0.14514233862723103, -0.47847016786610447], 
            [0.191341716182545, -0.4619397662556433], 
            [0.2356983684129988, -0.4409606321741775], 
            [0.2777851165098009, -0.41573480615127273], 
            [0.3171966420818228, -0.38650522668136844], 
            [0.3535533905932737, -0.35355339059327384], 
            [0.38650522668136833, -0.31719664208182297], 
            [0.4157348061512726, -0.2777851165098011], 
            [0.4409606321741774, -0.23569836841299896], 
            [0.46193976625564326, -0.1913417161825452], 
            [0.4784701678661044, -0.14514233862723125], 
            [0.49039264020161516, -0.09754516100806436], 
            [0.49759236333609846, -0.04900857016478025]
        ],
        paths =
        [
            [0, 1, 2, 3, 4, 5, 6, 7, 8, 9, 10, 11, 12, 13, 14, 15, 16, 17, 18, 19, 20, 21, 22, 23, 24, 25, 26, 27, 28, 29, 30, 31, 32, 33, 34, 35, 36, 37, 38, 39, 40, 41, 42, 43, 44, 45, 46, 47, 48, 49, 50, 51, 52, 53, 54, 55, 56, 57, 58, 59, 60, 61, 62, 63]
        ]
    );
}

module M152()
{
    polygon
    (
        points =
        [
            [0.0, 0.0], 
            [11.0, 0.0], 
            [10.725999192966528, 2.439865019315903], 
            [9.917647034094292, 4.7581800414781155], 
            [8.615214276819337, 6.83945048702659], 
            [6.883585944159876, 8.57999094110038], 
            [4.809028865321491, 9.893090587501192], 
            [2.49489400645668, 10.713332996623718], 
            [0.056467698276940946, 10.999855062638385], 
            [-2.384771736248106, 10.738382735123208]
        ],
        paths =
        [
            [0, 1, 2, 3, 4, 5, 6, 7, 8, 9]
        ]
    );
}

module M8()
{
    polygon
    (
        points =
        [
            [-0.5, -0.5], 
            [0.5, -0.5], 
            [0.5, 0.5], 
            [-0.5, 0.5]
        ],
        paths =
        [
            [0, 1, 2, 3]
        ]
    );
}
